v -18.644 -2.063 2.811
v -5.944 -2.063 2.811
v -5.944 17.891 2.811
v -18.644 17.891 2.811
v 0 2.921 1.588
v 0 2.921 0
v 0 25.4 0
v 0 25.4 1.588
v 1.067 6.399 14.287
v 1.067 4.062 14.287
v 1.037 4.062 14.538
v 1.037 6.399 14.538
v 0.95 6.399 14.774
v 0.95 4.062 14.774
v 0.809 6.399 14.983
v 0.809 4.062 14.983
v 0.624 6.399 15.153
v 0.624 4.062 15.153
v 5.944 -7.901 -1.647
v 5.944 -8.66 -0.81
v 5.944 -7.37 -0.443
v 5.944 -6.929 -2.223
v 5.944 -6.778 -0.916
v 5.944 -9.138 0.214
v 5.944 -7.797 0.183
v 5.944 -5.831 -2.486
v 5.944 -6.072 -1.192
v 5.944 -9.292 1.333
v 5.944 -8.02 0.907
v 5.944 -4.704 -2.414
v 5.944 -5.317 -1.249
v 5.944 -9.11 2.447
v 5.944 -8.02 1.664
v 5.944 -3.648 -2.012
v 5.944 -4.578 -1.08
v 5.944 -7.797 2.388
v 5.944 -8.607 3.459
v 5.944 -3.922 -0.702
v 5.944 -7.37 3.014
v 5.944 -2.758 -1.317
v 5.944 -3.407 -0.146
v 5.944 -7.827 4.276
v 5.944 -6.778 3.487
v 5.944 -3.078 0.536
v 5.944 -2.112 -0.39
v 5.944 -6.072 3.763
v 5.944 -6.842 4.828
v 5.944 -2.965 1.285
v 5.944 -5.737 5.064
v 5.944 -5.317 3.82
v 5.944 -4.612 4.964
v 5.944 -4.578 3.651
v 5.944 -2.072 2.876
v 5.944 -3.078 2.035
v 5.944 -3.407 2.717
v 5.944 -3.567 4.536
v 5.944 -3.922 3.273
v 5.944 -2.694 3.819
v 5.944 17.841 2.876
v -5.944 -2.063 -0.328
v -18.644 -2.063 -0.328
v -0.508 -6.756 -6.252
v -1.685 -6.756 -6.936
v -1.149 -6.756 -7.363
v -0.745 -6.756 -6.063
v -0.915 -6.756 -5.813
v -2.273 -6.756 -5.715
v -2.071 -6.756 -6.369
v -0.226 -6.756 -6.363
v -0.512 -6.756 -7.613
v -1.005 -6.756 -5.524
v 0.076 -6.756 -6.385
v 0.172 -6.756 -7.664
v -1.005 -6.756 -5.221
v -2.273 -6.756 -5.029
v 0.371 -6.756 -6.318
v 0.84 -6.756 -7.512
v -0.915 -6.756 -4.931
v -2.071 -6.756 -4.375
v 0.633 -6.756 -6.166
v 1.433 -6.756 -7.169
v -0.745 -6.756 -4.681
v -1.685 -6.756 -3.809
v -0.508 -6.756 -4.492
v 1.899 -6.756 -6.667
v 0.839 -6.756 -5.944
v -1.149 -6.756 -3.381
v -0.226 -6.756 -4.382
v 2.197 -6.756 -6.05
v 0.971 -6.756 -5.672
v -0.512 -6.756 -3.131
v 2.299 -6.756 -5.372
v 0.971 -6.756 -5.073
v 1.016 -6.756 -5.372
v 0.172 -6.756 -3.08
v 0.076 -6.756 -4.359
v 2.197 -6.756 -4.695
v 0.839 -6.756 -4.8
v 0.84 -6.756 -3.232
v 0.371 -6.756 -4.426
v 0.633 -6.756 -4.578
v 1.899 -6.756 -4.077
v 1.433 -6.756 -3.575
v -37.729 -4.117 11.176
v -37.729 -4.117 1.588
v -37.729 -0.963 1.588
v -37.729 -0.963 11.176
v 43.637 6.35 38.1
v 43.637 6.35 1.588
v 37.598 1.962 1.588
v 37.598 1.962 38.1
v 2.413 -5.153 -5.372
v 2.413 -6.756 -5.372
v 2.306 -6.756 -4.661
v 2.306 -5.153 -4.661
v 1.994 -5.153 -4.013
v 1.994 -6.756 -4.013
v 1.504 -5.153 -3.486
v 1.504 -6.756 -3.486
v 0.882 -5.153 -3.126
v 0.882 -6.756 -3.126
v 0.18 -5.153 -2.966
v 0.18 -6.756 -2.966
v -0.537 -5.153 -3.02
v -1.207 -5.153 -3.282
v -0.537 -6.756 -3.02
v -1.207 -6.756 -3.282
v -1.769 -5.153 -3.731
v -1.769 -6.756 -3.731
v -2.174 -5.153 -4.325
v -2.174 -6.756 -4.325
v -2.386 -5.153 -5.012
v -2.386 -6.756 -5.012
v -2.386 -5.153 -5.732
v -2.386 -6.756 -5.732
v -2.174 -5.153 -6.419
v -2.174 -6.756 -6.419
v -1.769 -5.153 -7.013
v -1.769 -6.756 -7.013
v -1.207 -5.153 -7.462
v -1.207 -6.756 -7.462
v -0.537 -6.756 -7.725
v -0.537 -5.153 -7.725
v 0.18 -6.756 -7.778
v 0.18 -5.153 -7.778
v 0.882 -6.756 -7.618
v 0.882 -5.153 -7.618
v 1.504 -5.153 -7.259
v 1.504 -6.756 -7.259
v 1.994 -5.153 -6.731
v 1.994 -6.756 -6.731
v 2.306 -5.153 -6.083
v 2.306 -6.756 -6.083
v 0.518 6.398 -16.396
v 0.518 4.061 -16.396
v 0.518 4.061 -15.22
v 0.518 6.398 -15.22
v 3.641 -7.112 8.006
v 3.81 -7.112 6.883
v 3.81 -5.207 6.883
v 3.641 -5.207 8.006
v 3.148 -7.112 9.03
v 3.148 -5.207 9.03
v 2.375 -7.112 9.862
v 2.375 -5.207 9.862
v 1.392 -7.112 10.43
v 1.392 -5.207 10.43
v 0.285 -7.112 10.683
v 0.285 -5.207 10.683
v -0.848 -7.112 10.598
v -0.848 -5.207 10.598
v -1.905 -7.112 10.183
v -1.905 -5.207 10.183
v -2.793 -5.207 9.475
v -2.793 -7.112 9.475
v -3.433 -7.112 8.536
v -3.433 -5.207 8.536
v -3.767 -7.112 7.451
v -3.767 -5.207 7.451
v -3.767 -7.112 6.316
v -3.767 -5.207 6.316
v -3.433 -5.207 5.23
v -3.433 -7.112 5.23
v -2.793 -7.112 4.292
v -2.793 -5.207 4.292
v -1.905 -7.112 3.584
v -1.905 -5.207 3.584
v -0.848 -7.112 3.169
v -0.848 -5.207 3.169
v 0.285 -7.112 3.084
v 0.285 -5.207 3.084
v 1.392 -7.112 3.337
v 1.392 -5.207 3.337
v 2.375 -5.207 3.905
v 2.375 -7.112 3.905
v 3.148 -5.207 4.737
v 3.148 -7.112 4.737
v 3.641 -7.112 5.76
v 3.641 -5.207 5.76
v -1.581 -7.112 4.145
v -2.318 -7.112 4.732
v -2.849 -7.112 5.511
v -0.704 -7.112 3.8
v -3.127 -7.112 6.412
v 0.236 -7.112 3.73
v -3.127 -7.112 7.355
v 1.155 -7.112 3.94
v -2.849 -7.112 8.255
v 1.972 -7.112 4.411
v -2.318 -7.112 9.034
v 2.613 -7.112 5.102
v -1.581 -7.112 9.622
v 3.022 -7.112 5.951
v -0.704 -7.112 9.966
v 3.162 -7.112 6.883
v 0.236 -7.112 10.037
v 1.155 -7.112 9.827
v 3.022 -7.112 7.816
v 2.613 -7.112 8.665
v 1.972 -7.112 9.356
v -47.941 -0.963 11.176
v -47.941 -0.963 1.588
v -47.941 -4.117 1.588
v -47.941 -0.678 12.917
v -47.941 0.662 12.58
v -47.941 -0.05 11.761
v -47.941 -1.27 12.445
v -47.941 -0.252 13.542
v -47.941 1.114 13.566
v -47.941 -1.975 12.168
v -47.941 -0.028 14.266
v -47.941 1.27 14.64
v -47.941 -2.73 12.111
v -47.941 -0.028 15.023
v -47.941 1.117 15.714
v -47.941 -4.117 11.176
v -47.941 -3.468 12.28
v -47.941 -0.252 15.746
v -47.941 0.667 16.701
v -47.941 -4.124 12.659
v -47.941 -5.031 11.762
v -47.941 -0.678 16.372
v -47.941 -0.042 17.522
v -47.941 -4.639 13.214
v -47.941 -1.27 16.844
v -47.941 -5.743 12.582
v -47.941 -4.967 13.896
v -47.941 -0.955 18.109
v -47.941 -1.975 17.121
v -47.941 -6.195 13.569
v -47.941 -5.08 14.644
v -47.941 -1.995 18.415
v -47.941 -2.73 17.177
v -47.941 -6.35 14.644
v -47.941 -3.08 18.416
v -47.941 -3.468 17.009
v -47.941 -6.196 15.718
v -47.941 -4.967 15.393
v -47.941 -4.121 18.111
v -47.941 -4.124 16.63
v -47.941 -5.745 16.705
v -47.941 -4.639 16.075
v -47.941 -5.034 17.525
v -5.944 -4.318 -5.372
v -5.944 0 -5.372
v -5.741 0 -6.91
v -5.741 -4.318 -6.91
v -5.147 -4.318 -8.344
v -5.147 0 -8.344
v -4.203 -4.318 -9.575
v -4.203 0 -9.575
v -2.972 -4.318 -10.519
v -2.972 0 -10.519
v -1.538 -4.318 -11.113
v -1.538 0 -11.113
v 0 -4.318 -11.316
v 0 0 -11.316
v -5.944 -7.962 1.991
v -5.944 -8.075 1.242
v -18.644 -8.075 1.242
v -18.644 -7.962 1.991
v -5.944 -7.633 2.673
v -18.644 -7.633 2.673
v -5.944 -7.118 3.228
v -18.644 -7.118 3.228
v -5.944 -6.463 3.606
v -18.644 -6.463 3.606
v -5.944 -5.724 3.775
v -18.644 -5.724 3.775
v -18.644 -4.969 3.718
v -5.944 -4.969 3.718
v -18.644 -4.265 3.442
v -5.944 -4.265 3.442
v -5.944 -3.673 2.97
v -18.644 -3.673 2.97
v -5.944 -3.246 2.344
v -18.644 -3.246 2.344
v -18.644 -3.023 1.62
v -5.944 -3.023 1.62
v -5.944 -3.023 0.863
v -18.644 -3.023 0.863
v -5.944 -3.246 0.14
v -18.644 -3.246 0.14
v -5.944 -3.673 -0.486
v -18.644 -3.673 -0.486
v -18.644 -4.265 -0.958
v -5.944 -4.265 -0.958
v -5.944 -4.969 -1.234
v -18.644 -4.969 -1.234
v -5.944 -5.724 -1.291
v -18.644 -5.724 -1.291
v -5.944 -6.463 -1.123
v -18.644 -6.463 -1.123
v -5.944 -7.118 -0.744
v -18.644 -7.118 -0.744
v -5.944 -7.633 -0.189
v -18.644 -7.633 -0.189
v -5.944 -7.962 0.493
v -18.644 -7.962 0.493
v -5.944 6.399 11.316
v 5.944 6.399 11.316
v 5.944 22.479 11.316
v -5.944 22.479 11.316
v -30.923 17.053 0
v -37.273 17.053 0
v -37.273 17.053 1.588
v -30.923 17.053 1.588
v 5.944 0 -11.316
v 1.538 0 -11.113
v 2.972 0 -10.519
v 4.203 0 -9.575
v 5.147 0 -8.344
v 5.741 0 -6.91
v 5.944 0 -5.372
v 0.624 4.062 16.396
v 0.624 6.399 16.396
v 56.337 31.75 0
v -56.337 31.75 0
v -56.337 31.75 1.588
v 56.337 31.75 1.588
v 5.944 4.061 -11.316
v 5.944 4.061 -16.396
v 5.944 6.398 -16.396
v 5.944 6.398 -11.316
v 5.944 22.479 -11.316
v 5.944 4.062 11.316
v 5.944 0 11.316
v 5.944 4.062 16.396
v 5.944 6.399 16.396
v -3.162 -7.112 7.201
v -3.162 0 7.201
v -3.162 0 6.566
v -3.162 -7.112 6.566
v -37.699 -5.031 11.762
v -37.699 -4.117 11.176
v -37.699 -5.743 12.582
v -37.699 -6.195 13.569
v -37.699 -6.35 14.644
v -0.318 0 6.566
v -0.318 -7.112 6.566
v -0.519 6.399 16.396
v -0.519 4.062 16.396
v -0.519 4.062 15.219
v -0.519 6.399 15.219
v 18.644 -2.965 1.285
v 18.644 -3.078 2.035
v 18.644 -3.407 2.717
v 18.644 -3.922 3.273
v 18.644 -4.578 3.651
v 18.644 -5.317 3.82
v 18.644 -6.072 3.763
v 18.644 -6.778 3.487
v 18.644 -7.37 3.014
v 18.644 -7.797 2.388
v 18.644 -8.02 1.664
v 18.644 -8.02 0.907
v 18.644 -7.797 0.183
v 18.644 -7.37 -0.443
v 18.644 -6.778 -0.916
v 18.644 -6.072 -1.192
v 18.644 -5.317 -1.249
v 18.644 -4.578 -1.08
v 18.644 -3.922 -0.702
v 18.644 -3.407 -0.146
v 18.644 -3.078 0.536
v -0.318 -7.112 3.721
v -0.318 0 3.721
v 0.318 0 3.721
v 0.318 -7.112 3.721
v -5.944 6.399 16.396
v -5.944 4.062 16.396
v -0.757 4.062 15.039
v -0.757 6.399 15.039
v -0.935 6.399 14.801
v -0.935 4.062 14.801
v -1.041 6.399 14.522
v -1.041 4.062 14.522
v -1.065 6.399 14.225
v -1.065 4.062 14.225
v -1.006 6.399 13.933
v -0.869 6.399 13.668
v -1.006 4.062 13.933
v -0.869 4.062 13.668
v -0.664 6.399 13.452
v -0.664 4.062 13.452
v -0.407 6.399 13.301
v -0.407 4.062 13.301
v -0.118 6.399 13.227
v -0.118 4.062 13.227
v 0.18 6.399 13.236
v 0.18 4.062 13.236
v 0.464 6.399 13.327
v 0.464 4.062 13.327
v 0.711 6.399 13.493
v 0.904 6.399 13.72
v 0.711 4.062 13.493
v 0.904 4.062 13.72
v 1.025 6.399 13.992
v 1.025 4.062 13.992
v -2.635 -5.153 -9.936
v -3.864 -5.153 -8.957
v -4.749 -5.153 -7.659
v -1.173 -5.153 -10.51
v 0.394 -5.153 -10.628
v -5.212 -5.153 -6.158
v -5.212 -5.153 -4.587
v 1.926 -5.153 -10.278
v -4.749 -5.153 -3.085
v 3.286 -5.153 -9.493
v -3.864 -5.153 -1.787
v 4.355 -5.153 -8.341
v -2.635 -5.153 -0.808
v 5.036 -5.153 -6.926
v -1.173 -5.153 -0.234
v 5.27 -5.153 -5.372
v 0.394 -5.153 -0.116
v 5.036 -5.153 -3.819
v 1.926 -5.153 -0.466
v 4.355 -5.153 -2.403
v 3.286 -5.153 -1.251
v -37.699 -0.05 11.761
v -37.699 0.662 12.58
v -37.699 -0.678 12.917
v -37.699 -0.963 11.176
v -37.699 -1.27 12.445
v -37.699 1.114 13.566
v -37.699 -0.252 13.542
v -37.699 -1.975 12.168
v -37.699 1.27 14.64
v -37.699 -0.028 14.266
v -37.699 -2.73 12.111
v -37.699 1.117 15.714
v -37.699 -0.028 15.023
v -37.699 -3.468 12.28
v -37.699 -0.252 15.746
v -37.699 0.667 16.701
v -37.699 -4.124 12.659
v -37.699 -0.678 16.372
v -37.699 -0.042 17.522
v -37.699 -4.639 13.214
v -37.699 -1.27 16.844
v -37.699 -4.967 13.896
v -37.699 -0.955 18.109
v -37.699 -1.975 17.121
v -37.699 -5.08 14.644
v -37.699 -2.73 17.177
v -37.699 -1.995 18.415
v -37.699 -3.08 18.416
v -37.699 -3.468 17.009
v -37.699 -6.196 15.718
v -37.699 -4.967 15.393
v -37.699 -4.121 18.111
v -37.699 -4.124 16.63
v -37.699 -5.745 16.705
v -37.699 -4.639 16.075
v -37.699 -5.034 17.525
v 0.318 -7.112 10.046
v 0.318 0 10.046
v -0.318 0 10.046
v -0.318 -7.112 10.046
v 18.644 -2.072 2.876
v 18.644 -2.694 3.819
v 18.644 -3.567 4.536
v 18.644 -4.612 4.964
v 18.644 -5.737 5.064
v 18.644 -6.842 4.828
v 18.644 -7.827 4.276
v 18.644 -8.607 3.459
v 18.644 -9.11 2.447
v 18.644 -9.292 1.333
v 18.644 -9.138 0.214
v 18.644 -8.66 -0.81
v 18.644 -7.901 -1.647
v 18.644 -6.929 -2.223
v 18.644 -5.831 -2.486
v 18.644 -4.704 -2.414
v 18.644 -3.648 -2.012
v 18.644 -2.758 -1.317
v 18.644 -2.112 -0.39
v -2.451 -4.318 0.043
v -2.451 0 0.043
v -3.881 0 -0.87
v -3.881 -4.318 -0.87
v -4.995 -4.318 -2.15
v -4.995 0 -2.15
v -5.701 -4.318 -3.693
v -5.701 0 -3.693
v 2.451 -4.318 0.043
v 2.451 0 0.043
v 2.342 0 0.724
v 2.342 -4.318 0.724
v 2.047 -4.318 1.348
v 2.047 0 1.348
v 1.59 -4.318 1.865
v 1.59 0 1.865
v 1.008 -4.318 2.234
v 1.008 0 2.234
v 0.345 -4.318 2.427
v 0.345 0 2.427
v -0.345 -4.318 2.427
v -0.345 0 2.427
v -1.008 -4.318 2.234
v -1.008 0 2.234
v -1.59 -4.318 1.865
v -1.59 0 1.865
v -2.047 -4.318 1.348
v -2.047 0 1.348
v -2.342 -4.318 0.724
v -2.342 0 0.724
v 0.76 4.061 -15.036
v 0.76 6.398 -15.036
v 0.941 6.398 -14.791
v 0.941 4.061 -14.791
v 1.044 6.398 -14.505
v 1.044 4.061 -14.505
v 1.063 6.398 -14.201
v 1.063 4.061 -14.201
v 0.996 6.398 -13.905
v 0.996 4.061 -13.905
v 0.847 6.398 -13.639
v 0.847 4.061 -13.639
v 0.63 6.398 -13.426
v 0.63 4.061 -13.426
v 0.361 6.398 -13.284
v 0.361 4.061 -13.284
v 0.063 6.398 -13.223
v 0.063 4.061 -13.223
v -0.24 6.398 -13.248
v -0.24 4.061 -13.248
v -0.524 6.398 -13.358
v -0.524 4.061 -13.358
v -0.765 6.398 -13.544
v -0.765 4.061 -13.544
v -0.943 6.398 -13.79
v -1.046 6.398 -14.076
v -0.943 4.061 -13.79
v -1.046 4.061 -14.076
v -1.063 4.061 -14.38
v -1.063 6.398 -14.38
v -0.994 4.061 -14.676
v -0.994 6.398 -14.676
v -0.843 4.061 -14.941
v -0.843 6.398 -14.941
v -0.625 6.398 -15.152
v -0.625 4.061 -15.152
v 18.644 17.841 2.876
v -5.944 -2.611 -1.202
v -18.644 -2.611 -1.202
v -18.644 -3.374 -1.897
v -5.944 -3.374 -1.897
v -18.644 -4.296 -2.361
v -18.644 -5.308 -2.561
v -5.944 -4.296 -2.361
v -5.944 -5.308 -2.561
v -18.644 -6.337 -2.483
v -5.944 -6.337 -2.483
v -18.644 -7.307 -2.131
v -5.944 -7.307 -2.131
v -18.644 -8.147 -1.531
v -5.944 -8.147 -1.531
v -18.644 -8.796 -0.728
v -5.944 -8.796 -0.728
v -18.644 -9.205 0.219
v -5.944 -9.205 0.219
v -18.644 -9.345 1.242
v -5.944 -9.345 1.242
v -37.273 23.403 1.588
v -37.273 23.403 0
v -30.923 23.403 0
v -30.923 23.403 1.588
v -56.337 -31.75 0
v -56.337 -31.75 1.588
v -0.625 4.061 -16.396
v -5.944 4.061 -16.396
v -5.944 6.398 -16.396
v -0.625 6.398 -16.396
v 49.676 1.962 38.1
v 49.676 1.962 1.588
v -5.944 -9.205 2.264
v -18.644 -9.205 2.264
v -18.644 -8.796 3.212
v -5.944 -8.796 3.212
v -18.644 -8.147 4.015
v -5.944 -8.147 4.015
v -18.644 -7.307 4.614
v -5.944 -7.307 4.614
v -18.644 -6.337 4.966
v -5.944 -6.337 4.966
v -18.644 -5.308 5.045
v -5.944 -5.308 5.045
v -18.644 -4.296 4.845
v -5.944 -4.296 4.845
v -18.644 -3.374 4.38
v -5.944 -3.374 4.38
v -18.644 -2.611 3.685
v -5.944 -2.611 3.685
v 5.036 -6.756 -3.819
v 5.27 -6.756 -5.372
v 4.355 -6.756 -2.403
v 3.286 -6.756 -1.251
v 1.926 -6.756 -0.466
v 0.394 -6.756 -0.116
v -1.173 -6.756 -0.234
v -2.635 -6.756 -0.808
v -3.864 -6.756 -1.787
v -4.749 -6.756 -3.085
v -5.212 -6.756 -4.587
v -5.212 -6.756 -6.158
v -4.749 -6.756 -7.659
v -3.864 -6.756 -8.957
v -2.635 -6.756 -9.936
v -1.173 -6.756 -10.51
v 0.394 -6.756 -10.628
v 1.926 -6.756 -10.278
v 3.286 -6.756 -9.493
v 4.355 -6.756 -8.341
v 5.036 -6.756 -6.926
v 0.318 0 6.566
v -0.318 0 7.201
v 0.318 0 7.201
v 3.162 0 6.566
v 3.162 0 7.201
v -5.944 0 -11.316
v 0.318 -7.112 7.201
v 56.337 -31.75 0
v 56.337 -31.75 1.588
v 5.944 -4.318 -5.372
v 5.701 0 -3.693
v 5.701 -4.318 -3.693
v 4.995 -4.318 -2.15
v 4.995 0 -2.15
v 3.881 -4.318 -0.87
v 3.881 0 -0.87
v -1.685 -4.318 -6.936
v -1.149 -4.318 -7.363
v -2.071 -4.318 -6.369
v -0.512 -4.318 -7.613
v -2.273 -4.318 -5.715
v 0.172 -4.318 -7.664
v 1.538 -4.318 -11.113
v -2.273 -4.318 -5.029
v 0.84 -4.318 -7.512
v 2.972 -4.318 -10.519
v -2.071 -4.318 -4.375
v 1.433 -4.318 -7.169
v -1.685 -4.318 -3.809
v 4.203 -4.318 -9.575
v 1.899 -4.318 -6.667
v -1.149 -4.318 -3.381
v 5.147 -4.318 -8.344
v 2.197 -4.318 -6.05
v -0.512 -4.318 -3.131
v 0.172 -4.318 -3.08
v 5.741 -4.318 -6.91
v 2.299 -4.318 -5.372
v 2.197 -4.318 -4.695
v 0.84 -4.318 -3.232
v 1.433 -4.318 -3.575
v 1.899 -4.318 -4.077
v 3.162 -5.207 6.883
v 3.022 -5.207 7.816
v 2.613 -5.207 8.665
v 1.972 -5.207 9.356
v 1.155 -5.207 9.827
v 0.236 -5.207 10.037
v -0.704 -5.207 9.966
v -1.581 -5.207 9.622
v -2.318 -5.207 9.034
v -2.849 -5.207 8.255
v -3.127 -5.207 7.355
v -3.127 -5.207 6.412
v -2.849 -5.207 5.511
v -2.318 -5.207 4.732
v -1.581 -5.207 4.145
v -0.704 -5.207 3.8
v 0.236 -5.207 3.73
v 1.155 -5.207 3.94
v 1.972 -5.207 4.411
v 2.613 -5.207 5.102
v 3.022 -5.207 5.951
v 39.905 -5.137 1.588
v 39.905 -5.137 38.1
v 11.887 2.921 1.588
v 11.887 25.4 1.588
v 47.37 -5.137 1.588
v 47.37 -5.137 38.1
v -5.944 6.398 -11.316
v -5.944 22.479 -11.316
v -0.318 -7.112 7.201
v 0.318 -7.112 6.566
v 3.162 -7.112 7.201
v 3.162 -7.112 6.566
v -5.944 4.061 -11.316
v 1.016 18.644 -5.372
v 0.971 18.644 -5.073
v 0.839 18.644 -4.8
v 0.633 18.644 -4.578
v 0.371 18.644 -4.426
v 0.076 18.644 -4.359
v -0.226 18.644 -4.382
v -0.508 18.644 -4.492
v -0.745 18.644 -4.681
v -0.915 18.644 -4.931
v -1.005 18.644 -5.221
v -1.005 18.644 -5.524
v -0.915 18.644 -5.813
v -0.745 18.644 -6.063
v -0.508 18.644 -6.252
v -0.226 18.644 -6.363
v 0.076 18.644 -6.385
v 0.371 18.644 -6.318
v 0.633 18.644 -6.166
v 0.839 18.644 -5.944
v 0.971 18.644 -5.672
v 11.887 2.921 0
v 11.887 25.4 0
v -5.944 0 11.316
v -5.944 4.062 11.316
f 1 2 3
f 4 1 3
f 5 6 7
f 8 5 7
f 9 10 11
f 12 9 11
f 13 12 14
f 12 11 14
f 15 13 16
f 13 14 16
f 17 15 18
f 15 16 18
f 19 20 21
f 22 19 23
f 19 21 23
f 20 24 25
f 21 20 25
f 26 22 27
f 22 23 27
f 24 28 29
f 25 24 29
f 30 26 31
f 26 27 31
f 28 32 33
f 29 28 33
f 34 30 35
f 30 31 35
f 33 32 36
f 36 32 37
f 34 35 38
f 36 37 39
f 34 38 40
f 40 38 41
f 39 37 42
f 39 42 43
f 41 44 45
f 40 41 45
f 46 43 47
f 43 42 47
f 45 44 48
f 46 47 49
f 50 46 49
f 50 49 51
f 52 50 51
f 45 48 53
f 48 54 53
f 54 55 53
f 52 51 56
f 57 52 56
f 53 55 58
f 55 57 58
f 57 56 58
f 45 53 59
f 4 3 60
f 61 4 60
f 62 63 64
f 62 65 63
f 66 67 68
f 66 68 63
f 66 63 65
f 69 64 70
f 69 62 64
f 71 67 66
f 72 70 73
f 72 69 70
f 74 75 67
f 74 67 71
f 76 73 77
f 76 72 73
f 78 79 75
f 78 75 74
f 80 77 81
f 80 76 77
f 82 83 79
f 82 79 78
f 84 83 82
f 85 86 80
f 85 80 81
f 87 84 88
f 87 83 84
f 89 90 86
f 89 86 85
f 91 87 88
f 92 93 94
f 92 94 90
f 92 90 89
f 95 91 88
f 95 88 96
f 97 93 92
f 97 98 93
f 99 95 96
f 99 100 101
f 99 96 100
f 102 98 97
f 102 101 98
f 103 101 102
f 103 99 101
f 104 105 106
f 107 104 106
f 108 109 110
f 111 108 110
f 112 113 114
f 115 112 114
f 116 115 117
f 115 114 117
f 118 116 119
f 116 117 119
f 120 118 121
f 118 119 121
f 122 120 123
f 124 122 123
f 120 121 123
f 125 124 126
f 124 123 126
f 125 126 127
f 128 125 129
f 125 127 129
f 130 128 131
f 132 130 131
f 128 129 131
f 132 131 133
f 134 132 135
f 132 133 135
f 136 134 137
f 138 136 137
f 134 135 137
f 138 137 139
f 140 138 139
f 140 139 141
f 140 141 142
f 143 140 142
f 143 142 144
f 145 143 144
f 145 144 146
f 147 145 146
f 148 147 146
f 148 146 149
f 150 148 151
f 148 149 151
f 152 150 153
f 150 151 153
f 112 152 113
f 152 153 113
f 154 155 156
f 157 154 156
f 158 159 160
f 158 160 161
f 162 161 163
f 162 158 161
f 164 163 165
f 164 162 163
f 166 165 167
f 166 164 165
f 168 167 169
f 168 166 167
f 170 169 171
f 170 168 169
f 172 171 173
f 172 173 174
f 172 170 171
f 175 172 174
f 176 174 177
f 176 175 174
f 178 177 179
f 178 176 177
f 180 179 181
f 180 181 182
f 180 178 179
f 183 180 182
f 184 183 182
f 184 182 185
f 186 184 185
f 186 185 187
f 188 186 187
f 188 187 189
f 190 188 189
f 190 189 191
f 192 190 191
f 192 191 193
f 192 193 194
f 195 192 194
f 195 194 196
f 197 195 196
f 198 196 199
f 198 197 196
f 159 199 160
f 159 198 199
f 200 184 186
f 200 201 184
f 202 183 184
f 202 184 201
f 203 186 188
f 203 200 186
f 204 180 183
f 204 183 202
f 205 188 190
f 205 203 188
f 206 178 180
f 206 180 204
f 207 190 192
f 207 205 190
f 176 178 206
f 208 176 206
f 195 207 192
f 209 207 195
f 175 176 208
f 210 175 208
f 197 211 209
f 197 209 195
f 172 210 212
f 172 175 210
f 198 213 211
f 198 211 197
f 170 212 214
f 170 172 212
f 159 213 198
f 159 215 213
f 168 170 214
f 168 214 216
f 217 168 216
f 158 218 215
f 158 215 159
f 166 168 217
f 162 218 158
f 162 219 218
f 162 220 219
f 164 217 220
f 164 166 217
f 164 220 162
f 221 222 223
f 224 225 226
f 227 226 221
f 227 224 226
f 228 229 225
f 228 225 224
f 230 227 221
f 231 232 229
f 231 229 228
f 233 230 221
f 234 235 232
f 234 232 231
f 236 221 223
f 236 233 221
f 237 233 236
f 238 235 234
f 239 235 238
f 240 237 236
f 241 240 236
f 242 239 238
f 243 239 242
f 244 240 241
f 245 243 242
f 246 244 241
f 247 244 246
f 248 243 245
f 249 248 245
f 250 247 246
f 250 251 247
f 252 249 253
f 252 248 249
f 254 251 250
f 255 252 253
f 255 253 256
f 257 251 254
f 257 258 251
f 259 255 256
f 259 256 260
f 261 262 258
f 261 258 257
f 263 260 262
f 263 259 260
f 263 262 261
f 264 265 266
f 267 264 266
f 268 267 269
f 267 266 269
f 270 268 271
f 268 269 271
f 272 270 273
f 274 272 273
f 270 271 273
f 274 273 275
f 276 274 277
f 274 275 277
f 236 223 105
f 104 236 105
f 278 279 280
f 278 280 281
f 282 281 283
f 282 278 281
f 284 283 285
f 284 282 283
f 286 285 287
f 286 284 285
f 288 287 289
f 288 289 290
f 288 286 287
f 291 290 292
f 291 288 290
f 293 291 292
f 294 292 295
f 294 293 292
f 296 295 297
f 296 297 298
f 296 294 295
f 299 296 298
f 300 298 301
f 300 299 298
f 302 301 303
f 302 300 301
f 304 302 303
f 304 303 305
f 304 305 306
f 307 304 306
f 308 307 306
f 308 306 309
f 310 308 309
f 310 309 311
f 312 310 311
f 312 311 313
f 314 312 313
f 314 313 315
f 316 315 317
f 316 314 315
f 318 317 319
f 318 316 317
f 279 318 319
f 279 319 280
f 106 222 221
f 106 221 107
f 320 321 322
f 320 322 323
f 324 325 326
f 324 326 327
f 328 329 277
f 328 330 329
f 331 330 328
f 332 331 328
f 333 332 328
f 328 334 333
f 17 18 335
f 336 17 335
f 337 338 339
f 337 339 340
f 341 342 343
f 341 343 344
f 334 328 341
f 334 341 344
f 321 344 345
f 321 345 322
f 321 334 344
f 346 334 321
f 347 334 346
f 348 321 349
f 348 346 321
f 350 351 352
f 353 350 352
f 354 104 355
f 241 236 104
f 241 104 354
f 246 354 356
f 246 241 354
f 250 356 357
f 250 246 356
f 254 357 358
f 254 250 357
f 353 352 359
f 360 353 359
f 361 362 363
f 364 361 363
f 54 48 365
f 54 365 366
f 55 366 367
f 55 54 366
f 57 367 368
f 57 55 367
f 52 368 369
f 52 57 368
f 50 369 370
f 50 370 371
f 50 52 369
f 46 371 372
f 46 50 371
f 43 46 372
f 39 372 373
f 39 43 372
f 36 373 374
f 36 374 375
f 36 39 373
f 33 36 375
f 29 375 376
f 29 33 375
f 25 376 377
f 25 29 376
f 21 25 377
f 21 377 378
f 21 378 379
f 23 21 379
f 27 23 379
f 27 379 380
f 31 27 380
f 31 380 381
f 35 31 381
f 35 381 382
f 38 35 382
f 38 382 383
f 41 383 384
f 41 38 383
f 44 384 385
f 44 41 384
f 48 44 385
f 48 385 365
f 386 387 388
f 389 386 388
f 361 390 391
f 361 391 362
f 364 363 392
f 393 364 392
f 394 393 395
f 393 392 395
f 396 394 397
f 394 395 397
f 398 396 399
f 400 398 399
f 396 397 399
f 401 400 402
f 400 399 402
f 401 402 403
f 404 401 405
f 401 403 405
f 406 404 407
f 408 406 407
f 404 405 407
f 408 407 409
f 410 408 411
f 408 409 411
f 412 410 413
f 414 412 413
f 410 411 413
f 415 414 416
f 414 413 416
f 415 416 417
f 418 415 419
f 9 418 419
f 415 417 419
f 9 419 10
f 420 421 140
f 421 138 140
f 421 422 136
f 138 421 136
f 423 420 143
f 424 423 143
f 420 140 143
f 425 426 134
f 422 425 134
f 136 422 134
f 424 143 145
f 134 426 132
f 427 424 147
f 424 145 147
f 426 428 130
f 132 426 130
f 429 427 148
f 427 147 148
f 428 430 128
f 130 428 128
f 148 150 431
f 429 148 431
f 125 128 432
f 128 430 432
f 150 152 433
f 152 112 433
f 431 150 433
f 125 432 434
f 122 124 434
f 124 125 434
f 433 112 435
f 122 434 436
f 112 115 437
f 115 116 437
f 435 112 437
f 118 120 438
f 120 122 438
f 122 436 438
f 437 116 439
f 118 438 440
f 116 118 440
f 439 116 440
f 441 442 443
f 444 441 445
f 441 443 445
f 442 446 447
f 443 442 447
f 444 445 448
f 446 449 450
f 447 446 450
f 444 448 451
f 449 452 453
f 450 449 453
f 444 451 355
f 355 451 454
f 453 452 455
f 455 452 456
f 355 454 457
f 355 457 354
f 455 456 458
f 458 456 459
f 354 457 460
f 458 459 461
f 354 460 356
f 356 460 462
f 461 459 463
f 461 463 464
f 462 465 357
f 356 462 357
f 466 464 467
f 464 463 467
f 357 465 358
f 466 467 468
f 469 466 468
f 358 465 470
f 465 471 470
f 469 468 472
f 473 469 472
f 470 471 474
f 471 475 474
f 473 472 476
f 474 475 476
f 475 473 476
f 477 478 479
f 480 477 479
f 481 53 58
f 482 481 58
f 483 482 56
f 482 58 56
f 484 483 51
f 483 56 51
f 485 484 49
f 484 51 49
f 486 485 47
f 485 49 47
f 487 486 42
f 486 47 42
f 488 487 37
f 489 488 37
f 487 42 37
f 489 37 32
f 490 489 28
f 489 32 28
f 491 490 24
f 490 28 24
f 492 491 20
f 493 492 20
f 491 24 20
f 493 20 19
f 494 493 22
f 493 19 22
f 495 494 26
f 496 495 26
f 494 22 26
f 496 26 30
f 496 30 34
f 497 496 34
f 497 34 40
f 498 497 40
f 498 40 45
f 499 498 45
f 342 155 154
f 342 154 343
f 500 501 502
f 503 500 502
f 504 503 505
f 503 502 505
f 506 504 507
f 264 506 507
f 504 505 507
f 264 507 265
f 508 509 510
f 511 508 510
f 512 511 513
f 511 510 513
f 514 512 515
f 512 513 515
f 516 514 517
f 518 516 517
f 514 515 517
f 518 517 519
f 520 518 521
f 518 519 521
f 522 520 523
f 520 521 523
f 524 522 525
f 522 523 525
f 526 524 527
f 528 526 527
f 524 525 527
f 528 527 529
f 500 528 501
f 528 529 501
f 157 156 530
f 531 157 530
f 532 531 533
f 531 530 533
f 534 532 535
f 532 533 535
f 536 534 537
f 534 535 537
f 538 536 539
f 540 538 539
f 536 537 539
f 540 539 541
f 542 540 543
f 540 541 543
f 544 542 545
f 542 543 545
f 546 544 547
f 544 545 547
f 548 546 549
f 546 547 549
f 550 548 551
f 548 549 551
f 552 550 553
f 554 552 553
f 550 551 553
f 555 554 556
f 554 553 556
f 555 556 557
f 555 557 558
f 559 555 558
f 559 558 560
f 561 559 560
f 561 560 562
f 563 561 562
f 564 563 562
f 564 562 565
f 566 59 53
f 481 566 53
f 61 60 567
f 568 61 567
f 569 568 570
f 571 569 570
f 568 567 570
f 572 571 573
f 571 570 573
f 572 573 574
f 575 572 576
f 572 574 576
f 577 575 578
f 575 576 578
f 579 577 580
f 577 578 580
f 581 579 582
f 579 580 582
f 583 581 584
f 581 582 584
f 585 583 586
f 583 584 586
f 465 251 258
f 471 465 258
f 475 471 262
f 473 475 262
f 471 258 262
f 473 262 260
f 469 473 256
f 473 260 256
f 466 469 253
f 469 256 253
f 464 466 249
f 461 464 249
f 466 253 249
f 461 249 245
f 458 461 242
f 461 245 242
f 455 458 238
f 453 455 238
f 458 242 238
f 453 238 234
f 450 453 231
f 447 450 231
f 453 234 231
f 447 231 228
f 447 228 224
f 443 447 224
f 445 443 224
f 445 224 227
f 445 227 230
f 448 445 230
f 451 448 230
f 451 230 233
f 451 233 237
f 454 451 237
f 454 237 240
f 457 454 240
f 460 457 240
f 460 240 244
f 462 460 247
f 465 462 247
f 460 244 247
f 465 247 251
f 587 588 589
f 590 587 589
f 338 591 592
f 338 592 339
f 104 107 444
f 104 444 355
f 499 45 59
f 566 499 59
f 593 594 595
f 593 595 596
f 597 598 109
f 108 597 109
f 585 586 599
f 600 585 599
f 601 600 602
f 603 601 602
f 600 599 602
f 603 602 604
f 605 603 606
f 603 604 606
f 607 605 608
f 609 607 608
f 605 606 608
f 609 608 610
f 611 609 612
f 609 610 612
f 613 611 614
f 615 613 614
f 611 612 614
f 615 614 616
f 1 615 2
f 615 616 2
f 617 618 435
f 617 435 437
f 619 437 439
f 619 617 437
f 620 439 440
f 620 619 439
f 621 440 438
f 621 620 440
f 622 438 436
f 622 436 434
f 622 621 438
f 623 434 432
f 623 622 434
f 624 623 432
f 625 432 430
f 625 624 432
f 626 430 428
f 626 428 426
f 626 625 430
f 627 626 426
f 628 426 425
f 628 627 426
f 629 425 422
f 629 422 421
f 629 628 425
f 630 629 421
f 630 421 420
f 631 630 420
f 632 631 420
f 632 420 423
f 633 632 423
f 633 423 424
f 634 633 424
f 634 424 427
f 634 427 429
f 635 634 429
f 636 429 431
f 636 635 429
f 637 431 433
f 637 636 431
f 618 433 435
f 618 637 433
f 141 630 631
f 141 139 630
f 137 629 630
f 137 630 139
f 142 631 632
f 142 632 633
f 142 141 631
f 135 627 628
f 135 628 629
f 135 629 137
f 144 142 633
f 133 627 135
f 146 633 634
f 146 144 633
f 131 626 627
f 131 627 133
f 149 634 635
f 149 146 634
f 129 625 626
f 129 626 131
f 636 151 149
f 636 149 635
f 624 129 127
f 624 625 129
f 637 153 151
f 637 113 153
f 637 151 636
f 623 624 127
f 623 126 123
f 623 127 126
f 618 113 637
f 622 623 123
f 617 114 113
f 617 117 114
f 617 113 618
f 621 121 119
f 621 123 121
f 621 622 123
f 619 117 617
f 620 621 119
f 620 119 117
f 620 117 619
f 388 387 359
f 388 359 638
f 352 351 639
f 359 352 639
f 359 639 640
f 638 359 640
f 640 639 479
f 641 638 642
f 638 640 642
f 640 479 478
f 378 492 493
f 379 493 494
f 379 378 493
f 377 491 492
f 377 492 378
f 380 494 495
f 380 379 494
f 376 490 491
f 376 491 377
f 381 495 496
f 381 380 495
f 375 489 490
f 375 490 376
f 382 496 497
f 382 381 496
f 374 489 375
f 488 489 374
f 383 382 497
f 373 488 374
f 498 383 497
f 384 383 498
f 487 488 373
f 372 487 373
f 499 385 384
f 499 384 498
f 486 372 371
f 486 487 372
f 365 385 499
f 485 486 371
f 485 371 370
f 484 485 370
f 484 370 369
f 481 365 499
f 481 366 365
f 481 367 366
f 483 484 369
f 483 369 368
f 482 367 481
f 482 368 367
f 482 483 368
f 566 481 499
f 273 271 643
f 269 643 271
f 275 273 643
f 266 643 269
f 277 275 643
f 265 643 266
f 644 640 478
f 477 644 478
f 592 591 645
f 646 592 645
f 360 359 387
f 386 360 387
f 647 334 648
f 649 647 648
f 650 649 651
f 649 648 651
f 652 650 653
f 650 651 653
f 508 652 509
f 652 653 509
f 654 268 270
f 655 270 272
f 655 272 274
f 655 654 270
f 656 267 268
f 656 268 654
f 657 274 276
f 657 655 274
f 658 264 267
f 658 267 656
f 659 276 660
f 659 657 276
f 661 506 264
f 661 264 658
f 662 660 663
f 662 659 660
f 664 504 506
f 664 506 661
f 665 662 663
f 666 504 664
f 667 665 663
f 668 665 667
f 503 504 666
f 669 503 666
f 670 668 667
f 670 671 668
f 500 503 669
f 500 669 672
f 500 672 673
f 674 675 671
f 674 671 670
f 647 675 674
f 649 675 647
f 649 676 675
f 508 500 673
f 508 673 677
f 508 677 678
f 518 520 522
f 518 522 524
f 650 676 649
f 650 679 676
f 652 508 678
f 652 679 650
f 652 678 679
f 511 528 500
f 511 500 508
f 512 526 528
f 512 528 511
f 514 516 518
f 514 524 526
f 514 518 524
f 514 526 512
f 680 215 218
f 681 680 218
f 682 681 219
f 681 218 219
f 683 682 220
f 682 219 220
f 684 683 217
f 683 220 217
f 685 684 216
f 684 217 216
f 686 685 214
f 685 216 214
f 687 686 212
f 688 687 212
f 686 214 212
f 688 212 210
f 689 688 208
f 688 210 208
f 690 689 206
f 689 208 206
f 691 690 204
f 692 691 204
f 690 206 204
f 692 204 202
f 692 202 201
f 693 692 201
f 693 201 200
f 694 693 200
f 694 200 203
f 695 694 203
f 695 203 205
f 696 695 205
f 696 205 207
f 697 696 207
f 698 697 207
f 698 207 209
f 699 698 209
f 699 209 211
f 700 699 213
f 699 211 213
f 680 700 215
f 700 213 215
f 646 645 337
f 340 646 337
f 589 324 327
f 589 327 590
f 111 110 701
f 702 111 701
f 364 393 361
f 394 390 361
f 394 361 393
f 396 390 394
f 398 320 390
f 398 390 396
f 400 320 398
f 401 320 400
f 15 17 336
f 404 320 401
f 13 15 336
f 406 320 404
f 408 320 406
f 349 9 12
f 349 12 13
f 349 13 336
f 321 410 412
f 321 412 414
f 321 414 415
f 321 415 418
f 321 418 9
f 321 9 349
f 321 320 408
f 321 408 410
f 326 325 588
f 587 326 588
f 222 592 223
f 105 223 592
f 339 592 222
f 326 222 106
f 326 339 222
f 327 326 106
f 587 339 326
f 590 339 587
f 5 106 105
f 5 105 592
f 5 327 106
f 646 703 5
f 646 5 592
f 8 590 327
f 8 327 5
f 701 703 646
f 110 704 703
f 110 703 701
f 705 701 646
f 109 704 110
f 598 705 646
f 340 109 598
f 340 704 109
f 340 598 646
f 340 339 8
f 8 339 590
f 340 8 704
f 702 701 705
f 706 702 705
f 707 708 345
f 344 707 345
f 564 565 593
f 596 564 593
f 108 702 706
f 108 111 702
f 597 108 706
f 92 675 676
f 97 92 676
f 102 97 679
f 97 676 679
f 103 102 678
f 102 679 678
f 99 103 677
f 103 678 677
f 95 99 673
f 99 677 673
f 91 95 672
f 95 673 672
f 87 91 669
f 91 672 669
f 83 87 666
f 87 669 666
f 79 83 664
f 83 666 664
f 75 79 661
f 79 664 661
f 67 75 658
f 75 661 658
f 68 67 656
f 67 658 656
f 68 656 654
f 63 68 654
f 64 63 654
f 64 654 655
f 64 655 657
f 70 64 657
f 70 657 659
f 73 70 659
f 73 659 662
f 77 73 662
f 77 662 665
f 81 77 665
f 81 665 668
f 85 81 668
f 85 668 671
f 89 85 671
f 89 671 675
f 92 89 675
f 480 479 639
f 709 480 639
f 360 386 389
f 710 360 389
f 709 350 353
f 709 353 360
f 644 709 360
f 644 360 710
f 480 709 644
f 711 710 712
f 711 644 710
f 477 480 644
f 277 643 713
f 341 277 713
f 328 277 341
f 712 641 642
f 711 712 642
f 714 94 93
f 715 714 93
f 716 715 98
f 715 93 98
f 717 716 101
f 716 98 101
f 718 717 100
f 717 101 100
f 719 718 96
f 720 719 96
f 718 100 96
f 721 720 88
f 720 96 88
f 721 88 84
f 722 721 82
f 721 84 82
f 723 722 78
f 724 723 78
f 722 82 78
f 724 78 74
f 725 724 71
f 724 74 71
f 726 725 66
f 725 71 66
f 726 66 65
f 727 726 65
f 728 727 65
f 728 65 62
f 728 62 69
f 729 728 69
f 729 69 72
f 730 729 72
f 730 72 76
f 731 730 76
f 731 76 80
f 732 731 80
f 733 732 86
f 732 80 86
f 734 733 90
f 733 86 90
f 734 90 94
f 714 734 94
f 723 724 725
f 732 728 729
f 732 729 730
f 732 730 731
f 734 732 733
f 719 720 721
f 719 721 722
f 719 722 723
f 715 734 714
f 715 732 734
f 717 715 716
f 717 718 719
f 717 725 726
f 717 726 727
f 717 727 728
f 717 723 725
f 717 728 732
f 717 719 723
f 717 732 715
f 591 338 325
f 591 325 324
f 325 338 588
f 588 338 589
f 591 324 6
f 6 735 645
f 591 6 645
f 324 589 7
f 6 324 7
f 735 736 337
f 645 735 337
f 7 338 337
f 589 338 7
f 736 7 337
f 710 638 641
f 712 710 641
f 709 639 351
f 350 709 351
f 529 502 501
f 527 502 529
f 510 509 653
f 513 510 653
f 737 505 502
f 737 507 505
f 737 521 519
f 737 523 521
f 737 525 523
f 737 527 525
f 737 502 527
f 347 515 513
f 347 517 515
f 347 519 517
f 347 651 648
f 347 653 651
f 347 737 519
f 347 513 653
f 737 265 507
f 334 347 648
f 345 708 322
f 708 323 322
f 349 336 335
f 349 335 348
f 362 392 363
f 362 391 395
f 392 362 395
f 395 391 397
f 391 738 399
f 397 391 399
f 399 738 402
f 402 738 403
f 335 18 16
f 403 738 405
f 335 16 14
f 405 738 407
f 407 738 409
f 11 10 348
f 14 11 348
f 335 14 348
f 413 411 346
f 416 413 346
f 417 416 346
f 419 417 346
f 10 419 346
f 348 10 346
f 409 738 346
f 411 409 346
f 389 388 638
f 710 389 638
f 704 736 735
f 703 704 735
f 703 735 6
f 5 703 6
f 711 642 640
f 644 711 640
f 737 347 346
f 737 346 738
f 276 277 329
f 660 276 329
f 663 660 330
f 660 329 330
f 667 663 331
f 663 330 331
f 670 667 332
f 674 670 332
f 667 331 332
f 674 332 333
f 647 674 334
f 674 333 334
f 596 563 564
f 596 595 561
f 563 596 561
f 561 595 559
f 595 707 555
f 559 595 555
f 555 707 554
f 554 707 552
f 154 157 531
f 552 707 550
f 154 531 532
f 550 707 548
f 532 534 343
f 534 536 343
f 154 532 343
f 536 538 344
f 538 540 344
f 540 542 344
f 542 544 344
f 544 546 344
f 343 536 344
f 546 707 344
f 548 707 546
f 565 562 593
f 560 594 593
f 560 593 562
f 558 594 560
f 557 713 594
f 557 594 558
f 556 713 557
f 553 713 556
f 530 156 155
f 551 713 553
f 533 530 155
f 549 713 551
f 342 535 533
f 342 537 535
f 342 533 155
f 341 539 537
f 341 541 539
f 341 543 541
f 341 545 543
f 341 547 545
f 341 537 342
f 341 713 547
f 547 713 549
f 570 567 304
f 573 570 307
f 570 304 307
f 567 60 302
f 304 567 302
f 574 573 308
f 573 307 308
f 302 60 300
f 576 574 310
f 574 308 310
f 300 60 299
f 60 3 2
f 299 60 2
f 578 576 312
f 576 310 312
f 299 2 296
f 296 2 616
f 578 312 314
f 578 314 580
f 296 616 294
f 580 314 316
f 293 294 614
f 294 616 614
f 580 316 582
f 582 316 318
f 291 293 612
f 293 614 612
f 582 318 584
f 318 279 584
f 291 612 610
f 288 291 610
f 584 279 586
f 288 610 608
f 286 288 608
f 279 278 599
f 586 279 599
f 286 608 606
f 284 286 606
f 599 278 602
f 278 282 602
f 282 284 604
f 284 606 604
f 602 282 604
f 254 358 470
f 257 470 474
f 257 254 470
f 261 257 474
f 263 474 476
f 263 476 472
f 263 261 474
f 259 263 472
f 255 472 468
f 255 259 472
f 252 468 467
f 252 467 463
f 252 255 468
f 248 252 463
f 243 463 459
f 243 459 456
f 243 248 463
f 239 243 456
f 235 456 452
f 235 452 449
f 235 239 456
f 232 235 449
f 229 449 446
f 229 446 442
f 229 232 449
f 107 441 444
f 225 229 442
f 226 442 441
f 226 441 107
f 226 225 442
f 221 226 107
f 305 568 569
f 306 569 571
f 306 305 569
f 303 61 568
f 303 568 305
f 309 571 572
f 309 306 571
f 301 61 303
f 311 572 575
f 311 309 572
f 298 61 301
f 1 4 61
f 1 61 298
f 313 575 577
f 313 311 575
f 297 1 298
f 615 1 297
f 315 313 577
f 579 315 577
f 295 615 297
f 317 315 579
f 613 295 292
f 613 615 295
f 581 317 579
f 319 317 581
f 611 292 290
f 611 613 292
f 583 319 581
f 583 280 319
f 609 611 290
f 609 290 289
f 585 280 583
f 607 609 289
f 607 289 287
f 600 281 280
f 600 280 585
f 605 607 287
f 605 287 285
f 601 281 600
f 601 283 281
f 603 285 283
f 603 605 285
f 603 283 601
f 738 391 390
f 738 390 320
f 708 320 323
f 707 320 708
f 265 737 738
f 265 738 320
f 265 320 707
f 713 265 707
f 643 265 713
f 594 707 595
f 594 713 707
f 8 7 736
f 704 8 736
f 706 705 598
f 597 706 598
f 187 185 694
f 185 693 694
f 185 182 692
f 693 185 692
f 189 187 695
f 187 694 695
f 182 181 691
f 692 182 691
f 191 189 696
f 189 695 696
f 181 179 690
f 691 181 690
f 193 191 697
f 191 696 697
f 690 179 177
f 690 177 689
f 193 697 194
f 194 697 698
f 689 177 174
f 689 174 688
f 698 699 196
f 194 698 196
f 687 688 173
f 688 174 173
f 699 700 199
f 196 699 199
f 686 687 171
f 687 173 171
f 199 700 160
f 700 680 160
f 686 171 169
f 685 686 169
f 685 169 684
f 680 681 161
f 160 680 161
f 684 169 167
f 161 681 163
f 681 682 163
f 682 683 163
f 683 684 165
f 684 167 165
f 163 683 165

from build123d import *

# Parameters (mm, degrees)
F0_W      = 112.6744
F0_H      = 63.5
F0_W_2    = 10.2123171091
F0_H_2    = 3.1538007315
F0_W_3    = 6.35
F0_H_3    = 6.35
F1_DEPTH  = 1.5875
F2_DEPTH  = 38.1
F3_R      = 2.2987
F4_DEPTH  = 4.318
F5_DEPTH  = 6.7564
F6_DEPTH  = 22.479
F7_W      = 11.8872
F7_H      = 2.3368
F8_DEPTH  = 5.08
F10_DEPTH = 2.48331
F11_W     = 11.8872
F11_H     = 2.3368
F12_DEPTH = 5.08
F14_DEPTH = 25.4
F15_R     = 1.016
F16_DEPTH = 25.4
F18_DEPTH = 7.112
F19_R     = 3.81
F19_R_2   = 3.1623
F20_DEPTH = 1.905
F21_R     = 5.2705
F21_R_2   = 2.413
F22_DEPTH = 1.60334
F23_R     = 2.54
F24_DEPTH = 12.7
F25_R     = 2.5415511009
F26_DEPTH = 12.7
F27_DEPTH = 11.176
F28_R     = 2.54
F29_DEPTH = 10.24225


with BuildPart() as f1:
    # F0 (on Top) → F1 (new body)
    with BuildSketch(Plane.XY):
        Rectangle(F0_W, F0_H)
        with Locations((-42.8348071873, -2.54)):
            Rectangle(F0_W_2, F0_H_2, mode=Mode.SUBTRACT)
        with Locations((-34.0979072105, 20.228437902)):
            Rectangle(F0_W_3, F0_H_3, mode=Mode.SUBTRACT)
        Polygon((0, 2.921), (0, 25.4), (5.9436, 25.4), (11.8872, 25.4), (11.8872, 2.921), (5.9436, 2.921), align=None, mode=Mode.SUBTRACT)
        Polygon((49.6764088785, 1.9622579143), (47.3696363521, -5.1372579143), (39.9047636479, -5.1372579143), (37.5979911215, 1.9622579143), (43.6372, 6.35), align=None, mode=Mode.SUBTRACT)
    extrude(amount=F1_DEPTH)

    # F0 (on Top) → F2 (join)
    with BuildSketch(Plane.XY):
        Polygon((39.9047636479, -5.1372579143), (47.3696363521, -5.1372579143), (49.6764088785, 1.9622579143), (43.6372, 6.35), (37.5979911215, 1.9622579143), align=None)
    extrude(amount=F2_DEPTH)

    # F0 (on Top) → F27 (join)
    with BuildSketch(Plane.XY):
        with Locations((-42.8348071873, -2.54)):
            Rectangle(F0_W_2, F0_H_2)
    extrude(amount=F27_DEPTH)

    # F28 (on face) → F29 (join)
    with BuildSketch(Plane(origin=(-47.9409657419, 0, 0), x_dir=(0, -1, 0), z_dir=(-1, 0, 0))):
        with BuildLine():
            ThreePointArc((4.1169003658, 11.176), (5.7434427101, 12.5818188188), (6.35, 14.6443548314))
            ThreePointArc((6.35, 14.6443548314), (0.4774639874, 17.8477975415), (0.9630996342, 11.176))
            Line((0.9630996342, 11.176), (4.1169003658, 11.176))
        make_face()
        with Locations((2.54, 14.6443548314)):
            Circle(F28_R, mode=Mode.SUBTRACT)
    extrude(amount=-F29_DEPTH)


with BuildPart() as f4:
    # F3 (on Front) → F4 (new body)
    with BuildSketch(Plane.XZ):
        with BuildLine():
            ThreePointArc((0, -11.3157), (4.2027598647, -9.5748598647), (5.9436, -5.3721))
            ThreePointArc((5.9436, -5.3721), (4.9946233933, -2.1502809302), (2.4507276268, 0.0427236407))
            ThreePointArc((2.4507276268, 0.0427236407), (2.4510069049, 0.0213626317), (2.4511, 0))
            ThreePointArc((2.4511, 0), (-0.0213626317, -2.4510069049), (-2.4507276268, 0.0427236407))
            ThreePointArc((-2.4507276268, 0.0427236407), (-4.9946233933, -2.1502809302), (-5.9436, -5.3721))
            ThreePointArc((-5.9436, -5.3721), (-4.2027598647, -9.5748598647), (0, -11.3157))
        make_face()
        with Locations((0, -5.3721)):
            Circle(F3_R, mode=Mode.SUBTRACT)
        with Locations((0, -5.3721)):
            Circle(F3_R)
        with BuildLine():
            ThreePointArc((2.4511, 0), (2.4510069049, 0.0213626317), (2.4507276268, 0.0427236407))
            ThreePointArc((2.4507276268, 0.0427236407), (0, 0.5715), (-2.4507276268, 0.0427236407))
            ThreePointArc((-2.4507276268, 0.0427236407), (-0.0213626317, -2.4510069049), (2.4511, 0))
        make_face()
        with BuildLine():
            ThreePointArc((-2.4507276268, 0.0427236407), (0, 0.5715), (2.4507276268, 0.0427236407))
            ThreePointArc((2.4507276268, 0.0427236407), (0, 2.4511), (-2.4507276268, 0.0427236407))
        make_face()
    extrude(amount=F4_DEPTH)

    # F3 (on Front) → F5 (join)
    with BuildSketch(Plane.XZ):
        with Locations((0, -5.3721)):
            Circle(F3_R)
    extrude(amount=F5_DEPTH)

    # F3 (on Front) → F6 (join)
    with BuildSketch(Plane.XZ):
        with BuildLine():
            ThreePointArc((2.4511, 0), (2.4510069049, 0.0213626317), (2.4507276268, 0.0427236407))
            ThreePointArc((2.4507276268, 0.0427236407), (0, 0.5715), (-2.4507276268, 0.0427236407))
            ThreePointArc((-2.4507276268, 0.0427236407), (-0.0213626317, -2.4510069049), (2.4511, 0))
        make_face()
        with BuildLine():
            ThreePointArc((0, -11.3157), (4.2027598647, -9.5748598647), (5.9436, -5.3721))
            ThreePointArc((5.9436, -5.3721), (4.9946233933, -2.1502809302), (2.4507276268, 0.0427236407))
            ThreePointArc((2.4507276268, 0.0427236407), (2.4510069049, 0.0213626317), (2.4511, 0))
            ThreePointArc((2.4511, 0), (-0.0213626317, -2.4510069049), (-2.4507276268, 0.0427236407))
            ThreePointArc((-2.4507276268, 0.0427236407), (-4.9946233933, -2.1502809302), (-5.9436, -5.3721))
            ThreePointArc((-5.9436, -5.3721), (-4.2027598647, -9.5748598647), (0, -11.3157))
        make_face()
        with Locations((0, -5.3721)):
            Circle(F3_R, mode=Mode.SUBTRACT)
        with Locations((0, -5.3721)):
            Circle(F3_R)
        with BuildLine():
            Line((5.9436, -11.3157), (5.9436, -5.3721))
            ThreePointArc((5.9436, -5.3721), (4.2027598647, -9.5748598647), (0, -11.3157))
            Line((0, -11.3157), (5.9436, -11.3157))
        make_face()
        with BuildLine():
            ThreePointArc((0, -11.3157), (-4.2027598647, -9.5748598647), (-5.9436, -5.3721))
            Line((-5.9436, -5.3721), (-5.9436, -11.3157))
            Line((-5.9436, -11.3157), (0, -11.3157))
        make_face()
        with BuildLine():
            Line((5.9436, -5.3721), (5.9436, 11.3157))
            Line((5.9436, 11.3157), (-5.9436, 11.3157))
            Line((-5.9436, 11.3157), (-5.9436, -5.3721))
            ThreePointArc((-5.9436, -5.3721), (-4.9946233933, -2.1502809302), (-2.4507276268, 0.0427236407))
            ThreePointArc((-2.4507276268, 0.0427236407), (0, 2.4511), (2.4507276268, 0.0427236407))
            ThreePointArc((2.4507276268, 0.0427236407), (4.9946233933, -2.1502809302), (5.9436, -5.3721))
        make_face()
        with BuildLine():
            ThreePointArc((-2.4507276268, 0.0427236407), (0, 0.5715), (2.4507276268, 0.0427236407))
            ThreePointArc((2.4507276268, 0.0427236407), (0, 2.4511), (-2.4507276268, 0.0427236407))
        make_face()
    extrude(amount=-F6_DEPTH)

    # F7 (on face) → F8 (join)
    with BuildSketch(Plane.XY.offset(11.3157)):
        with Locations((0, 5.2308826215)):
            Rectangle(F7_W, F7_H)
    extrude(amount=F8_DEPTH)

    # F9 (on face) → F10 (cut)
    with BuildSketch(Plane.XZ.offset(-4.0624826215)):
        with BuildLine():
            ThreePointArc((-0.5192814278, 15.2193846703), (-0.5404131812, 13.3677088098), (1.0668, 14.2875))
            ThreePointArc((1.0668, 14.2875), (0.9495907573, 14.7736477487), (0.6237185722, 15.152969458))
            Line((0.6237185722, 15.152969458), (0.6237185722, 15.0088137016))
            Line((0.6237185722, 15.0088137016), (-0.5192814278, 15.0088137016))
            Line((-0.5192814278, 15.0088137016), (-0.5192814278, 15.2193846703))
        make_face()
        with BuildLine():
            Line((0.6237185722, 15.0088137016), (0.6237185722, 15.152969458))
            ThreePointArc((0.6237185722, 15.152969458), (0.061883151, 15.3525036223), (-0.5192814278, 15.2193846703))
            Line((-0.5192814278, 15.2193846703), (-0.5192814278, 15.0088137016))
            Line((-0.5192814278, 15.0088137016), (0.6237185722, 15.0088137016))
        make_face()
        with BuildLine():
            ThreePointArc((-0.5192814278, 15.2193846703), (0.061883151, 15.3525036223), (0.6237185722, 15.152969458))
            Line((0.6237185722, 15.152969458), (0.6237185722, 16.3957))
            Line((0.6237185722, 16.3957), (-0.5192814278, 16.3957))
            Line((-0.5192814278, 16.3957), (-0.5192814278, 15.2193846703))
        make_face()
    extrude(amount=-F10_DEPTH, mode=Mode.SUBTRACT)

    # F11 (on face) → F12 (join)
    with BuildSketch(Plane(origin=(0, 0, -11.3157), x_dir=(1, 0, 0), z_dir=(0, 0, -1))):
        with Locations((0, -5.22986)):
            Rectangle(F11_W, F11_H)
    extrude(amount=F12_DEPTH)

    # F13 (on face) → F14 (cut)
    with BuildSketch(Plane.XZ.offset(-4.06146)):
        with BuildLine():
            Line((-0.62484, -16.3957), (0.51816, -16.3957))
            Line((0.51816, -16.3957), (0.51816, -15.2200086886))
            ThreePointArc((0.51816, -15.2200086886), (0.0632140085, -13.2225745429), (-0.62484, -15.1521601728))
            Line((-0.62484, -15.1521601728), (-0.62484, -16.3957))
        make_face()
    extrude(amount=-F14_DEPTH, mode=Mode.SUBTRACT)

    # F15 (on face) → F16 (cut)
    with BuildSketch(Plane.XZ.offset(6.7564)):
        with Locations((0, -5.3721)):
            Circle(F15_R)
    extrude(amount=-F16_DEPTH, mode=Mode.SUBTRACT)


with BuildPart() as f18:
    # F17 (on face) → F18 (new body)
    with BuildSketch(Plane.XZ):
        Polygon((0.3175, 10.0457), (0, 10.0457), (-0.3175, 10.0457), (-0.3175, 7.2009), (-3.1623, 7.2009), (-3.1623, 6.8834), (-3.1623, 6.5659), (-0.3175, 6.5659), (-0.3175, 3.7211), (0.3175, 3.7211), (0.3175, 6.5659), (3.1623, 6.5659), (3.1623, 7.2009), (0.3175, 7.2009), align=None)
    extrude(amount=F18_DEPTH)


with BuildPart() as f20:
    # F19 (on face) → F20 (new body)
    with BuildSketch(Plane.XZ.offset(7.112)):
        with Locations((0, 6.8834)):
            Circle(F19_R)
        with Locations((0, 6.8834)):
            Circle(F19_R_2, mode=Mode.SUBTRACT)
    extrude(amount=-F20_DEPTH)


with BuildPart() as f22:
    # F21 (on face) → F22 (new body)
    with BuildSketch(Plane.XZ.offset(6.7564)):
        with Locations((0, -5.3721)):
            Circle(F21_R)
        with Locations((0, -5.3721)):
            Circle(F21_R_2, mode=Mode.SUBTRACT)
    extrude(amount=-F22_DEPTH)


with BuildPart() as f24:
    # F23 (on face) → F24 (new body)
    with BuildSketch(Plane(origin=(-5.9436, 0, 0), x_dir=(0, -1, 0), z_dir=(-1, 0, 0))):
        with BuildLine():
            Line((2.0627967482, 2.8112942947), (-17.8912921724, 2.8112942947))
            Line((-17.8912921724, 2.8112942947), (2.0627967482, -0.3275605978))
            ThreePointArc((2.0627967482, -0.3275605978), (1.7245394649, 1.2418668484), (2.0627967482, 2.8112942947))
        make_face()
        with BuildLine():
            ThreePointArc((9.3445394649, 1.2418668484), (6.3372723748, 4.9663426337), (2.0627967482, 2.8112942947))
            ThreePointArc((2.0627967482, 2.8112942947), (1.7245394649, 1.2418668484), (2.0627967482, -0.3275605978))
            ThreePointArc((2.0627967482, -0.3275605978), (6.3372723748, -2.4826089369), (9.3445394649, 1.2418668484))
        make_face()
        with Locations((5.5345394649, 1.2418668484)):
            Circle(F23_R, mode=Mode.SUBTRACT)
    extrude(amount=F24_DEPTH)


with BuildPart() as f26:
    # F25 (on face) → F26 (new body)
    with BuildSketch(Plane.YZ.offset(5.9436)):
        with BuildLine():
            ThreePointArc((-2.1123207355, -0.3903365839), (-1.8202639704, 0.4250587769), (-1.7211828816, 1.2854945307))
            ThreePointArc((-1.7211828816, 1.2854945307), (-1.8098288556, 2.0999280003), (-2.0716152208, 2.8762191082))
            ThreePointArc((-2.0716152208, 2.8762191082), (-9.2921294544, 1.3326645995), (-2.1123207355, -0.3903365839))
        make_face()
        with Locations((-5.5068031124, 1.2854945307)):
            Circle(F25_R, mode=Mode.SUBTRACT)
        with BuildLine():
            ThreePointArc((-2.0716152208, 2.8762191082), (-1.8098288556, 2.0999280003), (-1.7211828816, 1.2854945307))
            ThreePointArc((-1.7211828816, 1.2854945307), (-1.8202639704, 0.4250587769), (-2.1123207355, -0.3903365839))
            Line((-2.1123207355, -0.3903365839), (17.8405269985, 2.8762191082))
            Line((17.8405269985, 2.8762191082), (-2.0716152208, 2.8762191082))
        make_face()
    extrude(amount=F26_DEPTH)


solid = Compound([f1.part, f4.part, f18.part, f20.part, f22.part, f24.part, f26.part])
